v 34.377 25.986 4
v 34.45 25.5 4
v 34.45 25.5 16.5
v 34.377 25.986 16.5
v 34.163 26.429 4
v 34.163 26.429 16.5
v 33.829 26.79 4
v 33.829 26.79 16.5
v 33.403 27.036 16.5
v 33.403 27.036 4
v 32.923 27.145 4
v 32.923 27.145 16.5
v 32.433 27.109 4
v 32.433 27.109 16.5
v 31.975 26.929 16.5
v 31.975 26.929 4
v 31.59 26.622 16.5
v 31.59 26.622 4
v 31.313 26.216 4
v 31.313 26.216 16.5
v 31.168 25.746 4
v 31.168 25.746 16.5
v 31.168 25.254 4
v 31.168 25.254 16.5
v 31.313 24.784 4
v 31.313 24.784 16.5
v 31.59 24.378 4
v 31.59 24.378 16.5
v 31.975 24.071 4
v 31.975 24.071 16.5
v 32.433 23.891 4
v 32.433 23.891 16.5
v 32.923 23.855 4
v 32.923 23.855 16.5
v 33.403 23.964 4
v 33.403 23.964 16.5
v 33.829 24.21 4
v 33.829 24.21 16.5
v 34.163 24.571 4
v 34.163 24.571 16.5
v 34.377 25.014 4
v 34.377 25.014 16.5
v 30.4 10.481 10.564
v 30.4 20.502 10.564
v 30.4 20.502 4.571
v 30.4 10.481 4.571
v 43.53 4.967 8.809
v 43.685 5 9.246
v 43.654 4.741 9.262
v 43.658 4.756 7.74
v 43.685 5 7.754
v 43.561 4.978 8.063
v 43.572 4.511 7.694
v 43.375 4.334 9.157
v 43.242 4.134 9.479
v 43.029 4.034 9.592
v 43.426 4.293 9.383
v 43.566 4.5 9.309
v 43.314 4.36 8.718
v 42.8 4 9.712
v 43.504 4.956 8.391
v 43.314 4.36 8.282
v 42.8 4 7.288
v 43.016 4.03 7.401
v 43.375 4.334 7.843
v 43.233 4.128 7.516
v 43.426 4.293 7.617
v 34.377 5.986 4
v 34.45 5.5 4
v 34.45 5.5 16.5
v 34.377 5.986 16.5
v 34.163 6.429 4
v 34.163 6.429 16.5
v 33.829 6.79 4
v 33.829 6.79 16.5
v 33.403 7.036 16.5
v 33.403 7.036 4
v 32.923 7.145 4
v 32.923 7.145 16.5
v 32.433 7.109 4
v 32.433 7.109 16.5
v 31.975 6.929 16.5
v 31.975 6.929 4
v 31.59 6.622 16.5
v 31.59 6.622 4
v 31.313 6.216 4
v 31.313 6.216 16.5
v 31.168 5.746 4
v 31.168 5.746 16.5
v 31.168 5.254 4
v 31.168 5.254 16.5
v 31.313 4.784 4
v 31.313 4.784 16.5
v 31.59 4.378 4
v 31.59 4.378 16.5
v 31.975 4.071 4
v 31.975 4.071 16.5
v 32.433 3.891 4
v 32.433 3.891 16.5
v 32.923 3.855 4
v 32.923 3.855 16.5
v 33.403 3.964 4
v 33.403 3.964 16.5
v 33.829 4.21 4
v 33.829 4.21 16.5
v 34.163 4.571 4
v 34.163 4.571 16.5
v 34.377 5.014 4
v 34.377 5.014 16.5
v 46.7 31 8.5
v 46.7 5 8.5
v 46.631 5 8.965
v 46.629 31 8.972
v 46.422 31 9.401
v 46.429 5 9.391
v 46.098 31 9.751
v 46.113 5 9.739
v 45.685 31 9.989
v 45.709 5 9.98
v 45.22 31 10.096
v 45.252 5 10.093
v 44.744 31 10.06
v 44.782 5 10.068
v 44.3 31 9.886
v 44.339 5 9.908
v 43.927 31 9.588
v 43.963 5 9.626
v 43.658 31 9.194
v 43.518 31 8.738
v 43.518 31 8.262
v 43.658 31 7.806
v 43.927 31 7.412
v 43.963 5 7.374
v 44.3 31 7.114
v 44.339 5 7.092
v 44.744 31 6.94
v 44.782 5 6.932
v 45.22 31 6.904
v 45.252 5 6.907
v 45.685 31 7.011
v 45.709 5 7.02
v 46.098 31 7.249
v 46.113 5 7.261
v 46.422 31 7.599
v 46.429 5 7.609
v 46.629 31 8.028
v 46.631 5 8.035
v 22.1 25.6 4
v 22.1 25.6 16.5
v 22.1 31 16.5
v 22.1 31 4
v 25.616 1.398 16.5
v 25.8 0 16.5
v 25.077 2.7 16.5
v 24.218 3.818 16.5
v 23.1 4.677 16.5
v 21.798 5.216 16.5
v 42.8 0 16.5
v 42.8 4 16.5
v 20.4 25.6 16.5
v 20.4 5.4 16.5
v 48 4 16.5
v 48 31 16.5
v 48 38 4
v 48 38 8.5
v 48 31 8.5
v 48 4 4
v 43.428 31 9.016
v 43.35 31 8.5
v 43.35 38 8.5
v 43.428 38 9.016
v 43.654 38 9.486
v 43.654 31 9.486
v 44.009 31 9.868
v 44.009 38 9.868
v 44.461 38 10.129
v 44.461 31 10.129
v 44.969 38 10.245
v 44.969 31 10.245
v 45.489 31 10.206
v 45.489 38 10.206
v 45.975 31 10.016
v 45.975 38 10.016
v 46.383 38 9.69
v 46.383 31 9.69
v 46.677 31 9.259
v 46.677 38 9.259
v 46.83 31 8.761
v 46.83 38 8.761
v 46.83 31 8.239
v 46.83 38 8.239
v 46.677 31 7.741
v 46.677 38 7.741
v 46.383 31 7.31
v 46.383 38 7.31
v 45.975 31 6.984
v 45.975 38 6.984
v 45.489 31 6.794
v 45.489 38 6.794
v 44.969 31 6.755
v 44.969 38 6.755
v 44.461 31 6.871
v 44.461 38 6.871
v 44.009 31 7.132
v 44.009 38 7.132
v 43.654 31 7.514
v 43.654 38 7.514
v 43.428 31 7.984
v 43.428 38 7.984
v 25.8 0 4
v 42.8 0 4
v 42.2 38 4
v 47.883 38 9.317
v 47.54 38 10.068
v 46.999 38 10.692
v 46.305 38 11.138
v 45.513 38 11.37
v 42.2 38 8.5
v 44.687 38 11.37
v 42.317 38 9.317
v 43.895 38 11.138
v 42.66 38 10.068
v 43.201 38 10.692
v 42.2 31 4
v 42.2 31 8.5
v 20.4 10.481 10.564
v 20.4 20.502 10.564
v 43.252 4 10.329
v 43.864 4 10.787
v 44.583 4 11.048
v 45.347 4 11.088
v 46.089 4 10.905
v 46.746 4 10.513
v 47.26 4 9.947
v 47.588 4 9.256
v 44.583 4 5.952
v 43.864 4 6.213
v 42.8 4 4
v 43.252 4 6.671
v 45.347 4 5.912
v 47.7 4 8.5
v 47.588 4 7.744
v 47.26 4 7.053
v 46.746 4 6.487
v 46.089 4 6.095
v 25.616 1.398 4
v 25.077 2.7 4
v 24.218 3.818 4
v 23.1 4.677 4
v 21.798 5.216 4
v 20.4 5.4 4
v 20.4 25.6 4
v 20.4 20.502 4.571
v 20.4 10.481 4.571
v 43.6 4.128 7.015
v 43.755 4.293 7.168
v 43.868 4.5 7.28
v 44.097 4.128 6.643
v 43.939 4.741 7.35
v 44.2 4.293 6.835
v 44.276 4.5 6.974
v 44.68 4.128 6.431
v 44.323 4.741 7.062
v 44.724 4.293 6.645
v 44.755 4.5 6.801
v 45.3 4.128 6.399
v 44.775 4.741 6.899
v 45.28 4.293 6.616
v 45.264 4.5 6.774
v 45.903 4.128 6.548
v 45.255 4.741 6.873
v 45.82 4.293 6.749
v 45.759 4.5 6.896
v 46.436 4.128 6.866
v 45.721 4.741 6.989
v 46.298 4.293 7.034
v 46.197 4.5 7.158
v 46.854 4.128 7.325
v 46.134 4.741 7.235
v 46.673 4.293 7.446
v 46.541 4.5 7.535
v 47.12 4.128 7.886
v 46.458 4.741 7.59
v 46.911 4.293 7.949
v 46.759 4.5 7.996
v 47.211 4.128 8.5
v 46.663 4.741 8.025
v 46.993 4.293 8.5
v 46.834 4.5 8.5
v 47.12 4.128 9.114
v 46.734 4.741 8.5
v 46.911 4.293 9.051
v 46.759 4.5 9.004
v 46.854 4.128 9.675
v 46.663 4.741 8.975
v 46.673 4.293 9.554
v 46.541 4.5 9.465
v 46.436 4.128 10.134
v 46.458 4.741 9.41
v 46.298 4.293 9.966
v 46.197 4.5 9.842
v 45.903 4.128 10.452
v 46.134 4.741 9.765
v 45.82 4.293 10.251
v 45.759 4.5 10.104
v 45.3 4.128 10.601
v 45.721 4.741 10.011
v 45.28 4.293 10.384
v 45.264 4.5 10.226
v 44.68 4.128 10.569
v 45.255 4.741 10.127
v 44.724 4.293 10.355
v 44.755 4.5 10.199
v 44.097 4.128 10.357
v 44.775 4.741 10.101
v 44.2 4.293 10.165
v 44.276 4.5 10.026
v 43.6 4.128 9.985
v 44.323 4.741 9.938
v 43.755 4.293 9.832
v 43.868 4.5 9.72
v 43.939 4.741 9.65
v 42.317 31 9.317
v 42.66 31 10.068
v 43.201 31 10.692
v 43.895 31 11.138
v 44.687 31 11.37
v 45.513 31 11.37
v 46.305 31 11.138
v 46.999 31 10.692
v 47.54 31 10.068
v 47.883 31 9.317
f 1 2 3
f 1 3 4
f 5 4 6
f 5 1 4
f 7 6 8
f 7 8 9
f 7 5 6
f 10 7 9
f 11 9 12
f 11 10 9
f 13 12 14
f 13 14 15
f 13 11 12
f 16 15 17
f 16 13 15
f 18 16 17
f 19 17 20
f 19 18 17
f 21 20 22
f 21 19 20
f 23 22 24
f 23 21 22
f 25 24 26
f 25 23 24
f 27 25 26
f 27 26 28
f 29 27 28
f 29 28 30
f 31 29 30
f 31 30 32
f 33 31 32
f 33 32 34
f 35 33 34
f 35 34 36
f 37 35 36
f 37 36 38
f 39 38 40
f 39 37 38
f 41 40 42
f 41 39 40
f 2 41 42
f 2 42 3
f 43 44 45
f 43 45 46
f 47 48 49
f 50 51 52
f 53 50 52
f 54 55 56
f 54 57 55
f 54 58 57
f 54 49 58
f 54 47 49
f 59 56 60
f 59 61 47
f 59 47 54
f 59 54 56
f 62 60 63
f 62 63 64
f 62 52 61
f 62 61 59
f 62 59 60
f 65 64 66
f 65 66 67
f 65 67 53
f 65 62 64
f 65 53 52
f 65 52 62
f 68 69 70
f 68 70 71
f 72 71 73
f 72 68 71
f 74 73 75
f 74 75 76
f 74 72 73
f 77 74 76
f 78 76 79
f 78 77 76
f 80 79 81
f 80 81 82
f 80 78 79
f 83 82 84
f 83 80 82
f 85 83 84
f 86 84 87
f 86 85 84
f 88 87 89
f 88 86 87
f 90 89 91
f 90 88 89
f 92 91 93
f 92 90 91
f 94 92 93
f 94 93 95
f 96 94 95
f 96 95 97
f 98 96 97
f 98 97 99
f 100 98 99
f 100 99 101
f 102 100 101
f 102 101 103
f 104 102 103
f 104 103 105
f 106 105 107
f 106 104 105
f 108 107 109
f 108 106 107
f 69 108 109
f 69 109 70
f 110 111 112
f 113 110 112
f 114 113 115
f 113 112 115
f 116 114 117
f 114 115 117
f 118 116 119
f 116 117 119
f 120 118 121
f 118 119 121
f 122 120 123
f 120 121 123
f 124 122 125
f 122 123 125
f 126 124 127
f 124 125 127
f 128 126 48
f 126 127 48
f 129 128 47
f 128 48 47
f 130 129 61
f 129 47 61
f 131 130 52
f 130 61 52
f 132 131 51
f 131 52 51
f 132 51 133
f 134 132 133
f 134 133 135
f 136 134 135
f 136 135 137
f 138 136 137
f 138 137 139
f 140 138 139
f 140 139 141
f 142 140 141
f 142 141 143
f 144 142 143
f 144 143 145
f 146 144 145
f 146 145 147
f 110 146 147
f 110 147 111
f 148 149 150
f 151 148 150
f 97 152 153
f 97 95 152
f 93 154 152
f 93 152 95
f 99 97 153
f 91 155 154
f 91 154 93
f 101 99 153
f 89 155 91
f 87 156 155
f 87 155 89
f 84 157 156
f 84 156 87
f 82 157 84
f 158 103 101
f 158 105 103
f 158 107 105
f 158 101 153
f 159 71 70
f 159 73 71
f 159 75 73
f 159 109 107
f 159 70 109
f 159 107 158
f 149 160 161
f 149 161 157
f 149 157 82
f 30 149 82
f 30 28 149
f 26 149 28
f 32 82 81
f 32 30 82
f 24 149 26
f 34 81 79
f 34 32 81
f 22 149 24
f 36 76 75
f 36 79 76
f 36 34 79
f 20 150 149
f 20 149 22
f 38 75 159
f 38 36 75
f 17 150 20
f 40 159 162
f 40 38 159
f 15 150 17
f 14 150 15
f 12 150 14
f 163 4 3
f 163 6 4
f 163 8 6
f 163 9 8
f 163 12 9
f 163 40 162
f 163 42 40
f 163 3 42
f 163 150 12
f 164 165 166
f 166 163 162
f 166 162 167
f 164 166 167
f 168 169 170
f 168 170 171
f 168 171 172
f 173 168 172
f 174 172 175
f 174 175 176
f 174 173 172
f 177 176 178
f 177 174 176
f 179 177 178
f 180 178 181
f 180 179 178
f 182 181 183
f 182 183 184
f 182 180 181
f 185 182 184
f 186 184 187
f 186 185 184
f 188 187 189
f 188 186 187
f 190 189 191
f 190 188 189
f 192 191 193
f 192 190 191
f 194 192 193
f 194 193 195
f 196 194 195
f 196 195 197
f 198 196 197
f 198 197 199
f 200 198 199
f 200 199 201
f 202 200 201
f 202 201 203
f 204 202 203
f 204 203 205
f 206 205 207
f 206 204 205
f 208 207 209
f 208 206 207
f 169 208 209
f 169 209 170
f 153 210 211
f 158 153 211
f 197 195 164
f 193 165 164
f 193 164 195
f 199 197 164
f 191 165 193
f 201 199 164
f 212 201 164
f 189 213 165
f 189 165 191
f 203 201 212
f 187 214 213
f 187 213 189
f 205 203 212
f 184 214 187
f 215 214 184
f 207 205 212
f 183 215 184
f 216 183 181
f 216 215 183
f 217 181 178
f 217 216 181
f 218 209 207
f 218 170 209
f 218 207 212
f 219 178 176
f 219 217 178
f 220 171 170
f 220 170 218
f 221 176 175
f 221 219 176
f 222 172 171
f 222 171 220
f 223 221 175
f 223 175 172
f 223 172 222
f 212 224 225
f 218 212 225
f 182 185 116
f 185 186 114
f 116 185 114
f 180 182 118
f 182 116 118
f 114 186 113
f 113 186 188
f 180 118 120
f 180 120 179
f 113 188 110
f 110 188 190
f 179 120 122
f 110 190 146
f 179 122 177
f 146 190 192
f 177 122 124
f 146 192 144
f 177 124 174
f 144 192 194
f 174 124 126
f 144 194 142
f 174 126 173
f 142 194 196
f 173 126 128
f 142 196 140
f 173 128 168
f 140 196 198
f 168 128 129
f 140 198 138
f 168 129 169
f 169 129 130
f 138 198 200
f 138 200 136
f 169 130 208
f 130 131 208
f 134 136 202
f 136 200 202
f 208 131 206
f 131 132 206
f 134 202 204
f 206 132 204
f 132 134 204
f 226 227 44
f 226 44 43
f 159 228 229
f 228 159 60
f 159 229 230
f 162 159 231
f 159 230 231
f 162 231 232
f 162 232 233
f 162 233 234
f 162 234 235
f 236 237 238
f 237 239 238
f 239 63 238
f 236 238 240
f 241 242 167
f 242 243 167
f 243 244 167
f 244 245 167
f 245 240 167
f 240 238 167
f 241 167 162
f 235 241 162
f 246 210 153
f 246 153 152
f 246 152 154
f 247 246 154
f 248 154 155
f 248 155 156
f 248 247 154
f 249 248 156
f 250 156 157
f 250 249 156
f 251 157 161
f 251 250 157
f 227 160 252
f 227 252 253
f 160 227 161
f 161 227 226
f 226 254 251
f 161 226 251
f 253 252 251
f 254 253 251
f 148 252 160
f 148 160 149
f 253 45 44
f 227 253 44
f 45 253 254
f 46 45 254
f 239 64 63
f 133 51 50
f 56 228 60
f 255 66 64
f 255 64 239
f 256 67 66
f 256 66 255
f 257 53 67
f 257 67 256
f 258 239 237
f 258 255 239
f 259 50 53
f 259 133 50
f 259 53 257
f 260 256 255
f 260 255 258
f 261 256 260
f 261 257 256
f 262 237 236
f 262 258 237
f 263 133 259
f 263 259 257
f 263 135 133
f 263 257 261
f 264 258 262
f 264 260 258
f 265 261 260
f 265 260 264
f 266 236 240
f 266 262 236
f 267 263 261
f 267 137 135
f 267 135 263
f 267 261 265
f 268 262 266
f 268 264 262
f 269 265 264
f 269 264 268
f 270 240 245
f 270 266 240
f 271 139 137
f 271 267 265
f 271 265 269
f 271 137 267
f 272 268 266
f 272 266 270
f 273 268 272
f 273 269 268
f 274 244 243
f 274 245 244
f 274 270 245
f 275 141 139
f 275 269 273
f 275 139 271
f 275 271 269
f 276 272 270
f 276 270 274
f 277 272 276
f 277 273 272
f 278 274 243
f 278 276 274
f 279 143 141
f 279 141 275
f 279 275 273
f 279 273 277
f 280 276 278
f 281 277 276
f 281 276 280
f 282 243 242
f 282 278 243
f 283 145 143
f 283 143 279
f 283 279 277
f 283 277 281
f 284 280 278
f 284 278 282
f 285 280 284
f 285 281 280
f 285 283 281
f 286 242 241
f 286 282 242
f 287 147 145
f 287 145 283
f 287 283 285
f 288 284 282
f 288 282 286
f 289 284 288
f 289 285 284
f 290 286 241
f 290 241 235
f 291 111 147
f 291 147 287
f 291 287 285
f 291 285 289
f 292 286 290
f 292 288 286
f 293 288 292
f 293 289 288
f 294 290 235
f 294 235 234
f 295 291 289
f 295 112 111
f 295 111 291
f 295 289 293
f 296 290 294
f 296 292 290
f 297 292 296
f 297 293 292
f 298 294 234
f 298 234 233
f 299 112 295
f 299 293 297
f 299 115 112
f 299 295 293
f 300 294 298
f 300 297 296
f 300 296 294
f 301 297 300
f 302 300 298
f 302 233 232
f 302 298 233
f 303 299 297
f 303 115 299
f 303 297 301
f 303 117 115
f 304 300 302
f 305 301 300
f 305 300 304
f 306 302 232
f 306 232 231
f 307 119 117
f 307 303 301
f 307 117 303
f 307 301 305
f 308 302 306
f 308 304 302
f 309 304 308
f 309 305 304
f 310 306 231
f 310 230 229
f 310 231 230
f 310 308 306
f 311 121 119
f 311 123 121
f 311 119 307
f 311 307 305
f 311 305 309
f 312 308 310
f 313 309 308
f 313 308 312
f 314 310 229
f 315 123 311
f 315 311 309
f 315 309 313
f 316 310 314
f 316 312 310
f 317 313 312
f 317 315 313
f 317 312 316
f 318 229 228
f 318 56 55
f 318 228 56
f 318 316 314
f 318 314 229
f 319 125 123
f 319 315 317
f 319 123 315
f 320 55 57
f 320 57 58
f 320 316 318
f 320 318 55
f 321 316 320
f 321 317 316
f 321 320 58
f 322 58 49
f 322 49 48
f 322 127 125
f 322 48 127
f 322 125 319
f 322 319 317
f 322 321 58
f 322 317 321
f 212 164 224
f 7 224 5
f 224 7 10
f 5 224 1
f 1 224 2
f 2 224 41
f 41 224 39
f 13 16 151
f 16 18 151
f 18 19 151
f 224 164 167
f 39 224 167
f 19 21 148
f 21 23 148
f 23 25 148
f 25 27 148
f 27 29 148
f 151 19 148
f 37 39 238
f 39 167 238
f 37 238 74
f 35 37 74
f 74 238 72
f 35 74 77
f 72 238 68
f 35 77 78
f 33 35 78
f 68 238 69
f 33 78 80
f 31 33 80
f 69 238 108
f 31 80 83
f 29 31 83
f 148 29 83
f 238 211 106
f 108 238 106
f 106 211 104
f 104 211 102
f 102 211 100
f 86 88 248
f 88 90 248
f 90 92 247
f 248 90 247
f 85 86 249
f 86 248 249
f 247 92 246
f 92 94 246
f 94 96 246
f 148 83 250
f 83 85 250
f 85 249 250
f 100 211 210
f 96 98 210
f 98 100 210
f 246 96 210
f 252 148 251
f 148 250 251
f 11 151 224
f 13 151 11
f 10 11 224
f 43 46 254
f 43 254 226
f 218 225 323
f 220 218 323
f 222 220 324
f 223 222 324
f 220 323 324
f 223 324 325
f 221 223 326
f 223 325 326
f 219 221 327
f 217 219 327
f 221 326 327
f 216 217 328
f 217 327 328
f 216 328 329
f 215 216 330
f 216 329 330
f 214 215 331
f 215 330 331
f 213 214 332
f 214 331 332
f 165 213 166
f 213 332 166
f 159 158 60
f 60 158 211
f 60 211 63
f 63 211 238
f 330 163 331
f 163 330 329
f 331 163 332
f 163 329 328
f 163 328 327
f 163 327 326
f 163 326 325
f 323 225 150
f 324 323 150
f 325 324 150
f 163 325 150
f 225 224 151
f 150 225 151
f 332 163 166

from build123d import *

# Parameters (mm, degrees)
SKETCH002_R     = 1.65
PAD002_DEPTH    = 12.5
SKETCH003_R     = 1.75
PAD003_DEPTH    = 7
SKETCH004_W     = 10.021474
SKETCH004_H     = 5.992485
POCKET_DEPTH    = 10
SKETCH005_R     = 1.6
POCKET001_DEPTH = 30
FILLET001_R     = 1


with BuildPart() as part:
    # Sketch002 → Pad002 (new body)
    with BuildSketch(Plane.XY):
        with BuildLine():
            Line((5.4, 0), (22.4, 0))
            Line((22.4, 0), (22.4, 4))
            Line((22.4, 4), (27.6, 4))
            Line((27.6, 4), (27.6, 31))
            Line((27.6, 31), (1.7, 31))
            Line((1.7, 25.6), (1.7, 31))
            Line((0, 25.6), (1.7, 25.6))
            Line((0, 25.6), (0, 5.4))
            ThreePointArc((5.4, 0), (3.818377, 3.818377), (0, 5.4))
        make_face()
        with Locations((12.4, 25.5)):
            Circle(SKETCH002_R, mode=Mode.SUBTRACT)
        with Locations((12.4, 5.5)):
            Circle(SKETCH002_R, mode=Mode.SUBTRACT)
    extrude(amount=PAD002_DEPTH)

    # Sketch003 (on Face5 of Pad002) → Pad003 (join)
    with BuildSketch(Plane(origin=(0, 31, 0), x_dir=(-1, 0, 0), z_dir=(0, 1, 0))):
        with BuildLine():
            Line((-27.6, 0), (-21.8, 0))
            Line((-21.8, 0), (-21.8, 4.5))
            ThreePointArc((-21.8, 4.5), (-24.7, 7.4), (-27.6, 4.5))
            Line((-27.6, 4.5), (-27.6, 0))
        make_face()
        with Locations((-24.7, 4.5)):
            Circle(SKETCH003_R, mode=Mode.SUBTRACT)
    extrude(amount=PAD003_DEPTH)

    # Sketch004 (on Face6 of Pad003) → Pocket (cut)
    with BuildSketch(Plane(origin=(0, 0, 0), x_dir=(0, -1, 0), z_dir=(-1, 0, 0))):
        with Locations((-15.491406, 3.567648)):
            Rectangle(SKETCH004_W, SKETCH004_H)
    extrude(amount=-POCKET_DEPTH, mode=Mode.SUBTRACT)

    # Sketch005 (on Face7 of Pocket) → Pocket001 (cut)
    with BuildSketch(Plane.XZ.offset(-4)):
        with Locations((24.7, 4.5)):
            Circle(SKETCH005_R)
    extrude(amount=-POCKET001_DEPTH, mode=Mode.SUBTRACT)

    # Fillet001
    fillet001_edges = [part.edges().sort_by_distance(p)[0] for p in [
        (23.1, 4, 4.5),
    ]]
    fillet(fillet001_edges, radius=FILLET001_R)


with BuildPart() as part_1:
    # Body001 placement: moved
    add(part.part.moved(Location((20.4, 0, 4))))


solid = part_1.part
